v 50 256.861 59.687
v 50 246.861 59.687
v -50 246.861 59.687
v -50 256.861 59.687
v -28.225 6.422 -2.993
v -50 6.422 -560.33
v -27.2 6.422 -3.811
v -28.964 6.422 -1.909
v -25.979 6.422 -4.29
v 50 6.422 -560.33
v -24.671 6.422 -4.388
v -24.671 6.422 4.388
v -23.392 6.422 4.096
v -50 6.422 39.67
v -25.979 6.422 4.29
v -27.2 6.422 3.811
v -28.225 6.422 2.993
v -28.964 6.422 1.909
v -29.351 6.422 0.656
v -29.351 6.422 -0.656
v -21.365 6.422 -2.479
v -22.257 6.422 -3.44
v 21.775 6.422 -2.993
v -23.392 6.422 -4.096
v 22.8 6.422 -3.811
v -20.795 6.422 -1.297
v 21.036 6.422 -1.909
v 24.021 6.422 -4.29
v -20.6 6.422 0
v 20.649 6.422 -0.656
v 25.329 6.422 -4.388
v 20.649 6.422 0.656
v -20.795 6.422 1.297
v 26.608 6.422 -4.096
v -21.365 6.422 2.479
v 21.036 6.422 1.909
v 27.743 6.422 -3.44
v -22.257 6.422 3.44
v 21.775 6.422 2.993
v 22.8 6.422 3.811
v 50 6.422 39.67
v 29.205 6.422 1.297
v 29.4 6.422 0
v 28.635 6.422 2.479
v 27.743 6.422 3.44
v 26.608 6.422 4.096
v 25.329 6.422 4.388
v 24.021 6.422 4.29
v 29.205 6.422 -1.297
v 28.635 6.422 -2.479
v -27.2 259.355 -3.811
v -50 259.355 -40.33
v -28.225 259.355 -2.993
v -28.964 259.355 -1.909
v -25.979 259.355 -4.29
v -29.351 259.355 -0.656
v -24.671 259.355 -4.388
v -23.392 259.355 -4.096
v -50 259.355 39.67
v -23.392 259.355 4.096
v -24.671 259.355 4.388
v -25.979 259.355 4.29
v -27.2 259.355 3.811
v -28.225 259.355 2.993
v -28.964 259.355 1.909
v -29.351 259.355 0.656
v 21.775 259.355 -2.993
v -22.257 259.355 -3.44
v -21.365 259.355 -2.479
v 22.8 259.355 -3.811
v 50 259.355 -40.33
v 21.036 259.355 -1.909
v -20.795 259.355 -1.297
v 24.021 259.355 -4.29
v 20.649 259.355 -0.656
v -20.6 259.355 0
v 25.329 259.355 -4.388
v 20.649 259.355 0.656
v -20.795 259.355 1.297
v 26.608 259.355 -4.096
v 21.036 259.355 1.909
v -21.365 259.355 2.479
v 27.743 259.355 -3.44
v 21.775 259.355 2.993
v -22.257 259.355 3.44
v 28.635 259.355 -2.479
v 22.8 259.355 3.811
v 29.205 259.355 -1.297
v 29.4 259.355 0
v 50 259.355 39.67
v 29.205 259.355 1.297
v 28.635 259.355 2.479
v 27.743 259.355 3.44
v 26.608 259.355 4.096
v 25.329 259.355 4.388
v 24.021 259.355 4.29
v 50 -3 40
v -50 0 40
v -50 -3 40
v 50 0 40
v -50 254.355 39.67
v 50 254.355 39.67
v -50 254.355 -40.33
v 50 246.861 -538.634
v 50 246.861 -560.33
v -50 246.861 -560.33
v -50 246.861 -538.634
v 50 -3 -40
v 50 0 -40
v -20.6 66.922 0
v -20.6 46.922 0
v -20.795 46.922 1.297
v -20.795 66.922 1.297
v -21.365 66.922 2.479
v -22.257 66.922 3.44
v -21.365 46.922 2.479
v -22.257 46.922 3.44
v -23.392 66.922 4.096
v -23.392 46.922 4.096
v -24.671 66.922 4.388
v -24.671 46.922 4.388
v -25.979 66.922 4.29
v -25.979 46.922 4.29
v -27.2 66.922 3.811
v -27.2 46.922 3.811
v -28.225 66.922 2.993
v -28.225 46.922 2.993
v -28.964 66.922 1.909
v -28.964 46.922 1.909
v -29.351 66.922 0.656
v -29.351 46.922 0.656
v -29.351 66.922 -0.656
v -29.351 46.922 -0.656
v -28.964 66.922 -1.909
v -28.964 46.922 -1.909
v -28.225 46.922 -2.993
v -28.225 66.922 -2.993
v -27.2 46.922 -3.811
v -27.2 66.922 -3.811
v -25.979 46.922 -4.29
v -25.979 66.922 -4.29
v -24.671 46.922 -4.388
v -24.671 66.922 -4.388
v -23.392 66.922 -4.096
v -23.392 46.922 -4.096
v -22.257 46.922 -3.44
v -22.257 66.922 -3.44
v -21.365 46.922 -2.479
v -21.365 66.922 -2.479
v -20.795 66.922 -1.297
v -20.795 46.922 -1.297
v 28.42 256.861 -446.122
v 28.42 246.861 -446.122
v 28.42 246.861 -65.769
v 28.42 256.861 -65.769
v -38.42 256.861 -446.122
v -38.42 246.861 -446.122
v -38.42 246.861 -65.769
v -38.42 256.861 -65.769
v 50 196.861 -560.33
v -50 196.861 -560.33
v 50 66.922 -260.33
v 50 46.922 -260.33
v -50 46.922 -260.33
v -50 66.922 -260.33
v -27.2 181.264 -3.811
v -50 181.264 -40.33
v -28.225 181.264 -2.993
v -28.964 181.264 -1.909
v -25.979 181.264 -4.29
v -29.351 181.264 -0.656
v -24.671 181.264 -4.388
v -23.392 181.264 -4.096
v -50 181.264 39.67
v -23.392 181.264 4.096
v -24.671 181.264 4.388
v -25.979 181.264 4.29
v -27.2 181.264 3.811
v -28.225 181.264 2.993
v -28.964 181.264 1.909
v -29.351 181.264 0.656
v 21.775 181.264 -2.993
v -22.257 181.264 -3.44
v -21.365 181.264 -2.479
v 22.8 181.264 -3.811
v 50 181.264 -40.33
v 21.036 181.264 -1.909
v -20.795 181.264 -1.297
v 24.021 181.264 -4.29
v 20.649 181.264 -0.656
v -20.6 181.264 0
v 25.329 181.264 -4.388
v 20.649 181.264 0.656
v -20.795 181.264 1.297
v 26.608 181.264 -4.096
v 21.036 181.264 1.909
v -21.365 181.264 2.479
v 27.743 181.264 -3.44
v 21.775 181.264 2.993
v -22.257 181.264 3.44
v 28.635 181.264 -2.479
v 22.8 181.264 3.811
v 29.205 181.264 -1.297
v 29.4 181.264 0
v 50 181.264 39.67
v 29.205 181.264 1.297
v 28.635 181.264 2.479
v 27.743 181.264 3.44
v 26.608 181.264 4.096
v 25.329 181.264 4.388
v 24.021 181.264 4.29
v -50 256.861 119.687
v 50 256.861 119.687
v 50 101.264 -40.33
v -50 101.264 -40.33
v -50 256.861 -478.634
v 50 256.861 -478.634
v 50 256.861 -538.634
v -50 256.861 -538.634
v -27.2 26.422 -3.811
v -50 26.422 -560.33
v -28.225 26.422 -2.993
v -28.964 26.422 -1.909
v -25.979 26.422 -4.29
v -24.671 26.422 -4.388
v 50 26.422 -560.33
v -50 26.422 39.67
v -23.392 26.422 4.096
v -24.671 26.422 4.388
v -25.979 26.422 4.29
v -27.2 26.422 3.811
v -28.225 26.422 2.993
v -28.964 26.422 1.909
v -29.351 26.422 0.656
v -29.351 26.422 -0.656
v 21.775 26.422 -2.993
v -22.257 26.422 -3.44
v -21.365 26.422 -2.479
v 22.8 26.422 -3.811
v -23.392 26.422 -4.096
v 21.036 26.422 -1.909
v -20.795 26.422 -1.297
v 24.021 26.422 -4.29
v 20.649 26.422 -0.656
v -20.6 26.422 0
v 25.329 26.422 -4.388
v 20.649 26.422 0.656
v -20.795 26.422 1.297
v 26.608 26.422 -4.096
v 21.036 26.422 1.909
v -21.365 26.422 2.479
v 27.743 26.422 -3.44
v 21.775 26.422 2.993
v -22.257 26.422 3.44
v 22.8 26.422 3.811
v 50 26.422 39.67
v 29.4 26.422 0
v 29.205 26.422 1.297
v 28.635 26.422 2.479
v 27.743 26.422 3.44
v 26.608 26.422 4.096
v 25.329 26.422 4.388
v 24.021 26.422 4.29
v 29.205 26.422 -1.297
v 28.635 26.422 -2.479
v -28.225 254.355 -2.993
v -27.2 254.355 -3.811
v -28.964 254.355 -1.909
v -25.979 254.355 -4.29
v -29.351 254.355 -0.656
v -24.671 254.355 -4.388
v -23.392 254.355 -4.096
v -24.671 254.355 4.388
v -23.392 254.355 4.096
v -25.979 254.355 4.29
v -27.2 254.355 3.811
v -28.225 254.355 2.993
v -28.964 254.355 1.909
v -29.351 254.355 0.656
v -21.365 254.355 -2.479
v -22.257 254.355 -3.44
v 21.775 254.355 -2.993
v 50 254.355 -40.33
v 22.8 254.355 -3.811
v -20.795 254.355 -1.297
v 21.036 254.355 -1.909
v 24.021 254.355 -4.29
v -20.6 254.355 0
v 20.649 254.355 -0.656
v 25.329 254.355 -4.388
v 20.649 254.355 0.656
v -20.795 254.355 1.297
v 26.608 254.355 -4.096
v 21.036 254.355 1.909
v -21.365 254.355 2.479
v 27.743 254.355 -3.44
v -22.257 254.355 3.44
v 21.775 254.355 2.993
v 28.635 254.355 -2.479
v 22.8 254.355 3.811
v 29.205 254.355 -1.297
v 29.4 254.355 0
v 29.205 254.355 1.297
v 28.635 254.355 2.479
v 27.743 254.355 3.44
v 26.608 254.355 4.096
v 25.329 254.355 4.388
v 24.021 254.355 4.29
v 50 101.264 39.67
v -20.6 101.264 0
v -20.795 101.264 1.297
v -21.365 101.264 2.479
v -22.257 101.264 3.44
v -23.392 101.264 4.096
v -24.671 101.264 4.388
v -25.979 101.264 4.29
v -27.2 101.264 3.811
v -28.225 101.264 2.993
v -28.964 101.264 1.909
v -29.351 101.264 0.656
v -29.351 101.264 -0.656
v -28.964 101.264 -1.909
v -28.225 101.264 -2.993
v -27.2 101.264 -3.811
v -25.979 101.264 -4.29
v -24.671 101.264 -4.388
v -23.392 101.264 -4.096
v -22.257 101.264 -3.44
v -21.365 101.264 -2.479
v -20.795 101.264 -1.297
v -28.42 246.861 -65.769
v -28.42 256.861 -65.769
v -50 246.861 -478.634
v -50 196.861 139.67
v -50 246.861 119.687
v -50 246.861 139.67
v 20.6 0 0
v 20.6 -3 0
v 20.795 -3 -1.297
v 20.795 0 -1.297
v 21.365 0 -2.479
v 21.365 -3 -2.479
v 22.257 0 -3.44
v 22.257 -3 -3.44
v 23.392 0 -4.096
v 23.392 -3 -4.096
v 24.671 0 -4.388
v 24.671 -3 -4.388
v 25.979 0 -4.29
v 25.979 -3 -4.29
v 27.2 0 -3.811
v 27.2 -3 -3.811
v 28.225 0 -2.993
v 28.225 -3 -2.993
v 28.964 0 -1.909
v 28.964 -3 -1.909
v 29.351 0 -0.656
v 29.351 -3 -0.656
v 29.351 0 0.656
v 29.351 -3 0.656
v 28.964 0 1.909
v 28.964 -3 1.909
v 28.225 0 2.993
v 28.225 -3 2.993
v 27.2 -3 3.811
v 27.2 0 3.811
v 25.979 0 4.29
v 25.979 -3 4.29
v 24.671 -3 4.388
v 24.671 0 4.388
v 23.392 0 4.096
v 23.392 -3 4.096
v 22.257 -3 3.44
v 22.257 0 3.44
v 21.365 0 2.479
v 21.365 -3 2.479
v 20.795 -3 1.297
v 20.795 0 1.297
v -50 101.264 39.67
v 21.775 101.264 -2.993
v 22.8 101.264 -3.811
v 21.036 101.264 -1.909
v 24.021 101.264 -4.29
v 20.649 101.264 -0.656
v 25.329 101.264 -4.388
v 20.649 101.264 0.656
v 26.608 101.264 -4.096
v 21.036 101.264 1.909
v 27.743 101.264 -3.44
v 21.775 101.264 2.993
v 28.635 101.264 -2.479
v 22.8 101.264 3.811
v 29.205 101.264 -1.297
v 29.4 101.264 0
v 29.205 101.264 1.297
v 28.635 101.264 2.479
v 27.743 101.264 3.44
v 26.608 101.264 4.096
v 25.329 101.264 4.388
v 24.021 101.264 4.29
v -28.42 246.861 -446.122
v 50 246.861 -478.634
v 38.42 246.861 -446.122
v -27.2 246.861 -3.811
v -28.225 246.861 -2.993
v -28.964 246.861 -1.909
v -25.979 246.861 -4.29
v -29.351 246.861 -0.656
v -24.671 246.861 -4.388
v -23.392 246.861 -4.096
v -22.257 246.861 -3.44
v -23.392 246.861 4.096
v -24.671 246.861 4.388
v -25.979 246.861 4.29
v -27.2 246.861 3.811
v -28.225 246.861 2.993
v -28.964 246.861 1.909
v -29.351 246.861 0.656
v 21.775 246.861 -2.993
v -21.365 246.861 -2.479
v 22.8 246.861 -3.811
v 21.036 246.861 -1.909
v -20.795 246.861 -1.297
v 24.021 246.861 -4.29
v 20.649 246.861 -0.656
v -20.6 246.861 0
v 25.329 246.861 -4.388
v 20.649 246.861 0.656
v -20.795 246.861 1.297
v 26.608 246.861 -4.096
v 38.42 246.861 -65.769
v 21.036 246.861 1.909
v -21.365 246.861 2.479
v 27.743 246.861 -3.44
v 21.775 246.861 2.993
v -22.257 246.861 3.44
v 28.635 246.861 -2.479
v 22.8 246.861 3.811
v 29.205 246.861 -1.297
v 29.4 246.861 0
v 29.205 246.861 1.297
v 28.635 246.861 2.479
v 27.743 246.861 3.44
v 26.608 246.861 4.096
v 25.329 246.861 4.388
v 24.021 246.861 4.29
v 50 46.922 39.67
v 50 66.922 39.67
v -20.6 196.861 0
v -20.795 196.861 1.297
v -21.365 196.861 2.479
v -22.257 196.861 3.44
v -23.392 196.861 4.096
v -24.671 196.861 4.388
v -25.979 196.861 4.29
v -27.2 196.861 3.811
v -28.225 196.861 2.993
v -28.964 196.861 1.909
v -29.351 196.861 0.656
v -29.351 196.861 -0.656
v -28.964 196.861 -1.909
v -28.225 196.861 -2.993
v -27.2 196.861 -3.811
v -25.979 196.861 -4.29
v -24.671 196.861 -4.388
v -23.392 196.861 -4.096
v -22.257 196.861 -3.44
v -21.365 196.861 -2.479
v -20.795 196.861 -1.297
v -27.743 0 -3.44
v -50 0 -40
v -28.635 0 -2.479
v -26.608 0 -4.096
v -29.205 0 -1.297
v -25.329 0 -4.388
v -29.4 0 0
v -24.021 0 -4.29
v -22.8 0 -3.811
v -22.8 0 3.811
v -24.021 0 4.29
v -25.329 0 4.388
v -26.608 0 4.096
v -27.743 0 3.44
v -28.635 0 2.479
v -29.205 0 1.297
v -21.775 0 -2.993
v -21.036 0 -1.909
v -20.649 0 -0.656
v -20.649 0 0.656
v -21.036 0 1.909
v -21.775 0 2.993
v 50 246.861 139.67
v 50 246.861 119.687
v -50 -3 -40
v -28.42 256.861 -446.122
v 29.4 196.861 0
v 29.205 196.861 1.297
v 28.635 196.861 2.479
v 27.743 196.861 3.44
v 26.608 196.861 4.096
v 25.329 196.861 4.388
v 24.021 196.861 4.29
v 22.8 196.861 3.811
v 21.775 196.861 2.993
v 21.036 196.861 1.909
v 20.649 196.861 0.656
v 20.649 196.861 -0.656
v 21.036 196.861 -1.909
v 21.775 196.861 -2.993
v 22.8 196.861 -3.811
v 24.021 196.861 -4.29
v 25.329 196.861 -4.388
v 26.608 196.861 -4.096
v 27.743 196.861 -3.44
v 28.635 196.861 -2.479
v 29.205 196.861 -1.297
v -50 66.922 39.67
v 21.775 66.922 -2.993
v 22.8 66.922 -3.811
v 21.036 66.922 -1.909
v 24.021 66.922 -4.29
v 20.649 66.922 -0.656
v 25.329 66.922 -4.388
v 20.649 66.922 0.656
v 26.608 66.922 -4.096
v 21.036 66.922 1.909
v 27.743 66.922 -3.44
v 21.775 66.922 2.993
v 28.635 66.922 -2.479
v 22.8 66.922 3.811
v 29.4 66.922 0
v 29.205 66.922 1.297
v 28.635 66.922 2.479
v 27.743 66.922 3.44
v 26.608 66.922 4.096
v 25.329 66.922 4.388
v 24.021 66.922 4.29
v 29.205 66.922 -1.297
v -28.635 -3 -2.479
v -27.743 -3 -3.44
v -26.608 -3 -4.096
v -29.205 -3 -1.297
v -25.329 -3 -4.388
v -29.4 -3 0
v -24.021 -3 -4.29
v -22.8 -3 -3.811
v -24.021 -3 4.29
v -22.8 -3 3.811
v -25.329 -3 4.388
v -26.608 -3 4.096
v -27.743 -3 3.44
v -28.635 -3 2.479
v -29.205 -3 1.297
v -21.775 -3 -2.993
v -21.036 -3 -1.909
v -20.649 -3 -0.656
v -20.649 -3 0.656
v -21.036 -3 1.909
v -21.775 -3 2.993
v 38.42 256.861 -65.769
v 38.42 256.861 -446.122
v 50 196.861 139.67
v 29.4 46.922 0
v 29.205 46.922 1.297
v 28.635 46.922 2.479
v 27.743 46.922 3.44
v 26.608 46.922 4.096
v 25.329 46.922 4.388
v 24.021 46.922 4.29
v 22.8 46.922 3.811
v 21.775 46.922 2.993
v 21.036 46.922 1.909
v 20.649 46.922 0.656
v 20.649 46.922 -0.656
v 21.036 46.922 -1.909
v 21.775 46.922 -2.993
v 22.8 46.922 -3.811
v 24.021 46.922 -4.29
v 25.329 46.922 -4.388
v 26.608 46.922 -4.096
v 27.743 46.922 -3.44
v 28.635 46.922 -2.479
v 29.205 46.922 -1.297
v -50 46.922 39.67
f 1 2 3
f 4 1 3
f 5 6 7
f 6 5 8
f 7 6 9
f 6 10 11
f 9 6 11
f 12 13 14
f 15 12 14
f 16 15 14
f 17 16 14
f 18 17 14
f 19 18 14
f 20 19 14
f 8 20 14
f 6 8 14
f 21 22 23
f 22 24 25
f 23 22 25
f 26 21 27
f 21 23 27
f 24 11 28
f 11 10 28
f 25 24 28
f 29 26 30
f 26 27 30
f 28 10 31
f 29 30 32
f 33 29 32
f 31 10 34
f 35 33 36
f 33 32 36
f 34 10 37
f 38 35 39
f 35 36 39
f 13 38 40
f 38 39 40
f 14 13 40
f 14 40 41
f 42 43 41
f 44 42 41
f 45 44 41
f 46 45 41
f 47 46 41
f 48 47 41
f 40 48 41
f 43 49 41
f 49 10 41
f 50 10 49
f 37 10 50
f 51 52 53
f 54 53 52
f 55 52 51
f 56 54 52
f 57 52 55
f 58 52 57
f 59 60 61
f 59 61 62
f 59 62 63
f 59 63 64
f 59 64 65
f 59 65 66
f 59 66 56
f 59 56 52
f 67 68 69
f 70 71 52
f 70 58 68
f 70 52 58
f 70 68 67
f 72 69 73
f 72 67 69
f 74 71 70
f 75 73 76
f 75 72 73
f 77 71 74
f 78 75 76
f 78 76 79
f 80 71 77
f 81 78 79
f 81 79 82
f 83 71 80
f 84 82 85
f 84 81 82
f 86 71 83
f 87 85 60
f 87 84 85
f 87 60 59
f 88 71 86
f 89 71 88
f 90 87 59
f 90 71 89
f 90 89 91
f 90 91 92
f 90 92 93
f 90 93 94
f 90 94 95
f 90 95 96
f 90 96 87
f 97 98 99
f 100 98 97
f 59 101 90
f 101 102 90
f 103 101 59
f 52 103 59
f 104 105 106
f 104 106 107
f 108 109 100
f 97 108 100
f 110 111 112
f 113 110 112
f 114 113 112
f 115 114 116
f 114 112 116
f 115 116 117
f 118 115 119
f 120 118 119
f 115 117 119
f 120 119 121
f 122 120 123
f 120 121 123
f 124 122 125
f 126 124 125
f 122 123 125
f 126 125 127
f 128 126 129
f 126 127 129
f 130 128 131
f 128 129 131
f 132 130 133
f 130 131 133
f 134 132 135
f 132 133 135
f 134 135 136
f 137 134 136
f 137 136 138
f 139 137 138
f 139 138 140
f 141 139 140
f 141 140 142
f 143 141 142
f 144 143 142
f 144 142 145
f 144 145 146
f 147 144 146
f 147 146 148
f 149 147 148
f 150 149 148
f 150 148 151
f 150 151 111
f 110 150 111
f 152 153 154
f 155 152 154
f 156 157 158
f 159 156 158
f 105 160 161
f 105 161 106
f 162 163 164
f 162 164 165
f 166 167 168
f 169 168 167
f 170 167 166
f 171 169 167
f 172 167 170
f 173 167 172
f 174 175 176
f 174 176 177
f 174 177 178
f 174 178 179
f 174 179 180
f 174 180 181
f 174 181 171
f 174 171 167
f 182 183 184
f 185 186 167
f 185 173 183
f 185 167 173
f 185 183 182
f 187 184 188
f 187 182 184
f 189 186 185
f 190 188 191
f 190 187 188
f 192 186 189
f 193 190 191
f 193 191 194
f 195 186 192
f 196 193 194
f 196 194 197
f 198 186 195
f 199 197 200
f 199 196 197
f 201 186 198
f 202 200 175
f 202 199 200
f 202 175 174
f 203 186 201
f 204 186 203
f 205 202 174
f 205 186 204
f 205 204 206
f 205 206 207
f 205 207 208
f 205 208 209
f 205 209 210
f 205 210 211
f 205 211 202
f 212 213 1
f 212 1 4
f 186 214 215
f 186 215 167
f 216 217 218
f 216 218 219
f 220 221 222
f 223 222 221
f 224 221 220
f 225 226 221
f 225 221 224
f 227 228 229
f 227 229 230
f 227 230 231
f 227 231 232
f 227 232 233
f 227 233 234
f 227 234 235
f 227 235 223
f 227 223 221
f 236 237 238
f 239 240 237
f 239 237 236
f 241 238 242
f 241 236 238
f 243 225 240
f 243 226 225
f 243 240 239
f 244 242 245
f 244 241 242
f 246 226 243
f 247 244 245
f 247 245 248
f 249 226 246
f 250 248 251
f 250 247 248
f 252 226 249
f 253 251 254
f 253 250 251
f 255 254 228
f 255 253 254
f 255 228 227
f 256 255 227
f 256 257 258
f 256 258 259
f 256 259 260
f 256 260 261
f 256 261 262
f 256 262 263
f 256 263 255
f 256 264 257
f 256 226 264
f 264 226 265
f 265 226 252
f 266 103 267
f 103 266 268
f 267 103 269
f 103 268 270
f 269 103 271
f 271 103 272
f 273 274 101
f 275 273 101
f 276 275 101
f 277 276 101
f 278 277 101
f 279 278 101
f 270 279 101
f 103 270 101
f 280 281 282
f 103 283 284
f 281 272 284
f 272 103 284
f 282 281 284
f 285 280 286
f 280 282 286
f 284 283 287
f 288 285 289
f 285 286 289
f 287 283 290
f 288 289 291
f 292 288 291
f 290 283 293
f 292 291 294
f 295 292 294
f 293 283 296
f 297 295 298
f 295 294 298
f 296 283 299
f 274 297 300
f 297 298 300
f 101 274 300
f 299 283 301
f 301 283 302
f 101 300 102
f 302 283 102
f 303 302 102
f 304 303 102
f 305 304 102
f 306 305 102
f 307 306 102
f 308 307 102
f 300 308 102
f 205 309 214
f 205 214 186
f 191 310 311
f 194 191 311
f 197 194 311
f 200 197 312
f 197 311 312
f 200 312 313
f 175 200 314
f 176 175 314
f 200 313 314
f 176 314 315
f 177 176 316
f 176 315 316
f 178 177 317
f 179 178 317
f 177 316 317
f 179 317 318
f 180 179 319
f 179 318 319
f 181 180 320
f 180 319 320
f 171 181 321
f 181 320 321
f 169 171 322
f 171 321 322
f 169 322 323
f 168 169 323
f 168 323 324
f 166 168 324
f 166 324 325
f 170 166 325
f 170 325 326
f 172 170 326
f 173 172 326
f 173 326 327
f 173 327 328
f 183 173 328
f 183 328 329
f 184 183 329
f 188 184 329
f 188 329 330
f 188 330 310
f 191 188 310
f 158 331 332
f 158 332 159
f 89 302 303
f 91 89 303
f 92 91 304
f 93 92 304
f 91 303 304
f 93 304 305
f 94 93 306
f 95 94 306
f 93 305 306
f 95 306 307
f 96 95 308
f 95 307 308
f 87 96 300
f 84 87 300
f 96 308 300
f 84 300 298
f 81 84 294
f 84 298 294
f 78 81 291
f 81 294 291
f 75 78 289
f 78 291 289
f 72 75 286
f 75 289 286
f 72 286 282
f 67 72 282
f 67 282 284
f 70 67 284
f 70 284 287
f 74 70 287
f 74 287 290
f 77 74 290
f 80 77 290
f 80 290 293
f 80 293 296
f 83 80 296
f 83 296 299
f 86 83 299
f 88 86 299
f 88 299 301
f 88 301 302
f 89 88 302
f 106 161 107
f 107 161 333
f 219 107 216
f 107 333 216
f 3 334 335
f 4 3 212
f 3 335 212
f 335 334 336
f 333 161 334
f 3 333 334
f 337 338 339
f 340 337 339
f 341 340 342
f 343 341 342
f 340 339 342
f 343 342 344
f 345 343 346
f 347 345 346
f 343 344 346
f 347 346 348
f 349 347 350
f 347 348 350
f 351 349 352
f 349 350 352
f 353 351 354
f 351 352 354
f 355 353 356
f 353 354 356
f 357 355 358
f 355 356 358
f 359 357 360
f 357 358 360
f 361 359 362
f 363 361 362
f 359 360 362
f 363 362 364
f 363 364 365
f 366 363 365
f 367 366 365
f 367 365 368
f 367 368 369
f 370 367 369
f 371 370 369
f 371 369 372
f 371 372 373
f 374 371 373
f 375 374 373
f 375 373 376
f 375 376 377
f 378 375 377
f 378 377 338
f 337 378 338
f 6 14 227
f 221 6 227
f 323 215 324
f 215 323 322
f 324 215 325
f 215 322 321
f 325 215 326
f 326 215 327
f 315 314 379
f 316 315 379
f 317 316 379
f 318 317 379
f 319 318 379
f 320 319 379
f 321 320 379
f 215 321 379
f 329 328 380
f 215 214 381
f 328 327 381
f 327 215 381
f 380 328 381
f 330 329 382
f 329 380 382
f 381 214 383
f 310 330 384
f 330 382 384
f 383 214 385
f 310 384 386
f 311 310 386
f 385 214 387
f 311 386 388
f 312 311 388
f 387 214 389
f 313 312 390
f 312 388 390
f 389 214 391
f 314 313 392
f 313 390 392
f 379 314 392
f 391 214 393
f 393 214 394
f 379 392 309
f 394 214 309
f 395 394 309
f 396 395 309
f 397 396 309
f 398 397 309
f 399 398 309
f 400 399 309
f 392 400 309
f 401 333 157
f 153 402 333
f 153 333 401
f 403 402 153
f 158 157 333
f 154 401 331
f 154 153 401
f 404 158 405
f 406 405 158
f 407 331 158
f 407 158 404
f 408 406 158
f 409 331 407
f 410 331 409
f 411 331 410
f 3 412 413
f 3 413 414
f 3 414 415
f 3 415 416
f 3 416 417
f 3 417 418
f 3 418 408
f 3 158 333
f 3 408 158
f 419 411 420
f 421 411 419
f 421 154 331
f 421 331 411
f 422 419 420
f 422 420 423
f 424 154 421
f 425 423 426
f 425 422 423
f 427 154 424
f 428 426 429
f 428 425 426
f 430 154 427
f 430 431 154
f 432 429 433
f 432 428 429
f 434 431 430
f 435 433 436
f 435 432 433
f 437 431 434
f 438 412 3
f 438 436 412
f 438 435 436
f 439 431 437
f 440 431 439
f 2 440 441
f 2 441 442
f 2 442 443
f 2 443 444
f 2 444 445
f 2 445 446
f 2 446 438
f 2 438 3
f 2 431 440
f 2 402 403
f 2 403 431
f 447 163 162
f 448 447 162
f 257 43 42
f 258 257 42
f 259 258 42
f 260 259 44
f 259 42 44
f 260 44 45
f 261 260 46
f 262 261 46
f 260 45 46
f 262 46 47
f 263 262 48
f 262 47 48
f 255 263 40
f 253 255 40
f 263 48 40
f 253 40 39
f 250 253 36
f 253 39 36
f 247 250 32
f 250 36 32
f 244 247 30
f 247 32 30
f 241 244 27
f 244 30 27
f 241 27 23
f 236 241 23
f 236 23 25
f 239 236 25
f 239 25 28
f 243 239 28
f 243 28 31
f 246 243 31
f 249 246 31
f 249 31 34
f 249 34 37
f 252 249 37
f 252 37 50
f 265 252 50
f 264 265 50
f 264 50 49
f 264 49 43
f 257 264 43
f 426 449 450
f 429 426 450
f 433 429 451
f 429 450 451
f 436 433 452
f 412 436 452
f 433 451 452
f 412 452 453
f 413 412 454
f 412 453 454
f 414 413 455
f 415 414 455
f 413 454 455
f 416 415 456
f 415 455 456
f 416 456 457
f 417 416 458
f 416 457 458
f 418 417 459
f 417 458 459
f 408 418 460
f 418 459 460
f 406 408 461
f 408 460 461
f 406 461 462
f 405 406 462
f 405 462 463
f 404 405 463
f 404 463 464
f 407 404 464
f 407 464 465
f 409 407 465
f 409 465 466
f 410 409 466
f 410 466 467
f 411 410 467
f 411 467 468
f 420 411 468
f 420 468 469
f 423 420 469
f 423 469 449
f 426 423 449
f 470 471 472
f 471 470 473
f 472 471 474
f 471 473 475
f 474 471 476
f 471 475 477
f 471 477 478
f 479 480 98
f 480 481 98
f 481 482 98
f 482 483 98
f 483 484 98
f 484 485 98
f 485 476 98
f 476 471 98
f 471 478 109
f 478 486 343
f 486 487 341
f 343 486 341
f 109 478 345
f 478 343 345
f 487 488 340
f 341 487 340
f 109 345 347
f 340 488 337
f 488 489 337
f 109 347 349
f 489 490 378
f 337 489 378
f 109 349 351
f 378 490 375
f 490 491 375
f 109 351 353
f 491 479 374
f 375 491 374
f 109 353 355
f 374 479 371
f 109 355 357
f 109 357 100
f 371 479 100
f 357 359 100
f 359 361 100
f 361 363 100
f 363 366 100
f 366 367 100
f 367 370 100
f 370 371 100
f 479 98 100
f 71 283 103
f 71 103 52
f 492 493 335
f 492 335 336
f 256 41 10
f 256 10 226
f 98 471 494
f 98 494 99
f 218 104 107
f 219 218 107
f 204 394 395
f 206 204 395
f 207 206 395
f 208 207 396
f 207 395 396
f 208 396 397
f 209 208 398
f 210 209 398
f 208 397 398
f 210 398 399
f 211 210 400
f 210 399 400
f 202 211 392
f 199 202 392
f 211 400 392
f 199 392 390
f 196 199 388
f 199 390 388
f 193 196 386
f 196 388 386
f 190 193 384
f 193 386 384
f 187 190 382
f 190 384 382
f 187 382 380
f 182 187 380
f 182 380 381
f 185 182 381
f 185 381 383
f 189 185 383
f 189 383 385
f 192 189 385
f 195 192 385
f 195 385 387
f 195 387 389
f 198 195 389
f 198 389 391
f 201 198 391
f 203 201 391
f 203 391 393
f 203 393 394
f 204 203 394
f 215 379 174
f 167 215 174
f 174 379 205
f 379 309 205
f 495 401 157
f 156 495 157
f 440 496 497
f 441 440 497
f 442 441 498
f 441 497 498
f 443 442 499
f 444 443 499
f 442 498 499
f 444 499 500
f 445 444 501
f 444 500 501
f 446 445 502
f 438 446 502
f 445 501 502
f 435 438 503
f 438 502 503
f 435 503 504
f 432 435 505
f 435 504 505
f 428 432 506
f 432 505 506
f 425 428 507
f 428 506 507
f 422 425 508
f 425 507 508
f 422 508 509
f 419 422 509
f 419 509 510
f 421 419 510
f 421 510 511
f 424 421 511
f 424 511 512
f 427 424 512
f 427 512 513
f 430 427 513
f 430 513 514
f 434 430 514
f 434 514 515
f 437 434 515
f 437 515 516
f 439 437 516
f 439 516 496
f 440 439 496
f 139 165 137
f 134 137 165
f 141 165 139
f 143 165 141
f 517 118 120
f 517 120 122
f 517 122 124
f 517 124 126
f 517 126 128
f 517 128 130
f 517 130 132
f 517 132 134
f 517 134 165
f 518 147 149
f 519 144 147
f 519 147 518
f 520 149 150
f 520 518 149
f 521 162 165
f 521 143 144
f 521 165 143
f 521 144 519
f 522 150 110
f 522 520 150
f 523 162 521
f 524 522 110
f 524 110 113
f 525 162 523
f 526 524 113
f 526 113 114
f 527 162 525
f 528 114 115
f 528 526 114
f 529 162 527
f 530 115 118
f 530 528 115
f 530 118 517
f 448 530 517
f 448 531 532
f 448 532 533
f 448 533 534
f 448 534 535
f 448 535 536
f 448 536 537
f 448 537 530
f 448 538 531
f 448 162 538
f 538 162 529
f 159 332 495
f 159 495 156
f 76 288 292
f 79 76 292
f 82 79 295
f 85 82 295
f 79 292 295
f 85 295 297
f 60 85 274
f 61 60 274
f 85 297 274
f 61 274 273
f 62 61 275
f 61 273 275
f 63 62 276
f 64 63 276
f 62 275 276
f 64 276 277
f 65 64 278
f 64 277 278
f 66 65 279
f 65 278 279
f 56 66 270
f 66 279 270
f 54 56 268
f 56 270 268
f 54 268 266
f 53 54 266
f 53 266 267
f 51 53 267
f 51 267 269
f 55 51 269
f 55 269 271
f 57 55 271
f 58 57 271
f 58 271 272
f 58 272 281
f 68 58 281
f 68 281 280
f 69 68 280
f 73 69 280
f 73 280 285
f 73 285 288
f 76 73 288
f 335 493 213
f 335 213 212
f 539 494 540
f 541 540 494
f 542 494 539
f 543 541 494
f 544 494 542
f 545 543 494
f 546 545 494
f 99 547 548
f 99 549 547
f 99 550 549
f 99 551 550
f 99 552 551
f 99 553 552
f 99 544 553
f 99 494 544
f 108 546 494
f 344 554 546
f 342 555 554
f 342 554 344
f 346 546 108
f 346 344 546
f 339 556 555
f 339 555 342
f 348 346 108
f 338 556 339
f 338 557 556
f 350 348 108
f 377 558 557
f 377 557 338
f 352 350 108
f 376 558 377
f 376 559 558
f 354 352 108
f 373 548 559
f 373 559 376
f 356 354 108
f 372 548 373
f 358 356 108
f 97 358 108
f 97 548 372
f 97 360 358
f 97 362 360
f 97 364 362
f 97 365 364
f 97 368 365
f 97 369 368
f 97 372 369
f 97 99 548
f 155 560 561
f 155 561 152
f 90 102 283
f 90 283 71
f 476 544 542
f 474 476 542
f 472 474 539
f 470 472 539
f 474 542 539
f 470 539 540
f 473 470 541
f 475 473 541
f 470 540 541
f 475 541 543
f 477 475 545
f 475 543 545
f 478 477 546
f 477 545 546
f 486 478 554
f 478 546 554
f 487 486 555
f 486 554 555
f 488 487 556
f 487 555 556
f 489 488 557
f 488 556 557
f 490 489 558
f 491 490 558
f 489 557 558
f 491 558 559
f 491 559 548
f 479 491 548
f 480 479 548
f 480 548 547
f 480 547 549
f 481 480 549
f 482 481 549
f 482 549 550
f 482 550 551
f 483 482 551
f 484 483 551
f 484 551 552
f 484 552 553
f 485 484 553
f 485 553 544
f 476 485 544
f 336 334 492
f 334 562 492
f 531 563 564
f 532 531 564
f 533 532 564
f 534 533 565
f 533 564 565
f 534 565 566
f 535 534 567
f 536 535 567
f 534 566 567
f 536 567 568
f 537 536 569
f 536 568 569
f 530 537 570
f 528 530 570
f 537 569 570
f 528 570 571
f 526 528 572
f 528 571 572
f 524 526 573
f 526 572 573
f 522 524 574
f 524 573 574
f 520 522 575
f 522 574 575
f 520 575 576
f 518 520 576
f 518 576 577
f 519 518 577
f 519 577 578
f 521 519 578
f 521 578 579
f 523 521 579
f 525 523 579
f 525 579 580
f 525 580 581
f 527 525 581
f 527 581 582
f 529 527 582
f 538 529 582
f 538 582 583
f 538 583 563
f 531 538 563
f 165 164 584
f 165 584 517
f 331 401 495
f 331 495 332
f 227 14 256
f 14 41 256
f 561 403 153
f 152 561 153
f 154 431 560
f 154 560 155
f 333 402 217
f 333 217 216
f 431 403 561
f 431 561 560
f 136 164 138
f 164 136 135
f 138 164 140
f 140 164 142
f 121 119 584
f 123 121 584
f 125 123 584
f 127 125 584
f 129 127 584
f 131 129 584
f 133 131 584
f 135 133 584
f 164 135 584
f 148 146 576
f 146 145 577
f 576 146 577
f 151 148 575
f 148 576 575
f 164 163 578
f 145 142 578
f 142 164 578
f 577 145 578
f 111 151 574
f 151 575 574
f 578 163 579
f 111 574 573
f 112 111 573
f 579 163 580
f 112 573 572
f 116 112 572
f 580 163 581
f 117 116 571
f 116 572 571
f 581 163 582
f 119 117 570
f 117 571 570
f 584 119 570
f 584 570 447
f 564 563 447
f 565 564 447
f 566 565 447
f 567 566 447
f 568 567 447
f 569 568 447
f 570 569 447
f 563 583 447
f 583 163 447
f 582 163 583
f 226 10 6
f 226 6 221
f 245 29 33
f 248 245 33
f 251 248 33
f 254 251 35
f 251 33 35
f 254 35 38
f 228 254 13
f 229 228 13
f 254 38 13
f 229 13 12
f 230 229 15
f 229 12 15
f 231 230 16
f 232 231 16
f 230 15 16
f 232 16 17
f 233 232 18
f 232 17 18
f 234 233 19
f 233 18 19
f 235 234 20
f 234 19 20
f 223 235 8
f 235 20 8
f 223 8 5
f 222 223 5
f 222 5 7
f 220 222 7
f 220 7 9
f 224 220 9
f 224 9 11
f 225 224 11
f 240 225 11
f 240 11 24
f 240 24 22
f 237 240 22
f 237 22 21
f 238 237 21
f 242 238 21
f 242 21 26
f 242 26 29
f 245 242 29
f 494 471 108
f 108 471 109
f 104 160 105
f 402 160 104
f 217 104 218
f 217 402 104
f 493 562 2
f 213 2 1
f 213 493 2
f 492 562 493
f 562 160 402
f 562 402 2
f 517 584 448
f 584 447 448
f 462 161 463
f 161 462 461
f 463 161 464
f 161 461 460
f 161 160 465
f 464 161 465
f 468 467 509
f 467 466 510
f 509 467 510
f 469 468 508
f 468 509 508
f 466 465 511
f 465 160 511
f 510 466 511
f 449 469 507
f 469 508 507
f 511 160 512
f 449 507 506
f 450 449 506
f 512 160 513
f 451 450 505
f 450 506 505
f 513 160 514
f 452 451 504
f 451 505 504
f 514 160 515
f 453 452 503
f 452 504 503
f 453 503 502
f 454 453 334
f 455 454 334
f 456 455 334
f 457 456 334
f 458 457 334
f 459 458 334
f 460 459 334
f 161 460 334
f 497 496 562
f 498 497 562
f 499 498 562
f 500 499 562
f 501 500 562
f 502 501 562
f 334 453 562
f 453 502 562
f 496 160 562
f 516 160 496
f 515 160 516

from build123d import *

# Parameters (mm, degrees)
F0_W       = 100
F0_H       = 80
F1_DEPTH   = 3
F2_W       = 20
F2_H       = 600
F3_DEPTH   = 50
F2_W_2     = 80
F2_H_2     = 80
F2_W_3     = 50
F2_H_3     = 700
F2_W_4     = 5
F2_H_4     = 300
F4_D       = 8.8
F4_DEPTH   = 259.3560133705
F4_2_D     = 8.8
F4_2_DEPTH = 259.3560133705
F4_3_D     = 8.8
F4_3_DEPTH = 259.3560133705
F4_4_D     = 8.8
F4_4_DEPTH = 259.3560133705
F4_5_D     = 8.8
F4_5_DEPTH = 259.3560133705
F5_D       = 8.8
F6_W       = 10
F6_H       = 380.3535103798
F6_W_2     = 100
F6_H_2     = 60
F7_DEPTH   = 10


with BuildPart() as f1:
    # F0 (on Front) → F1 (new body)
    with BuildSketch(Plane.XZ):
        Rectangle(F0_W, F0_H)
    extrude(amount=F1_DEPTH)

    # F5 (through all)
    with Locations(Plane(origin=(0, 0, 0), x_dir=(1, 0, 0), z_dir=(0, 1, 0))):
        with Locations((-25, 0), (25, 0)):
            Hole(F5_D / 2)


with BuildPart() as f3:
    # F2 (on Right) → F3 (new body, symmetric)
    with BuildSketch(Plane.YZ):
        with Locations((16.4218770899, -260.329894186)):
            Rectangle(F2_W, F2_H)
    extrude(amount=F3_DEPTH, both=True)

    # F4 (through all, one way)
    with BuildSketch(Plane.XZ):
        with Locations((-25, 0), (25, 0)):
            Circle(F4_D / 2)
    extrude(amount=-F4_DEPTH, mode=Mode.SUBTRACT)


with BuildPart() as f3b:
    # F2 (on Right) → F3, piece 2 (new body, symmetric)
    with BuildSketch(Plane.YZ):
        with Locations((141.2636143714, -0.329894186)):
            Rectangle(F2_W_2, F2_H_2)
    extrude(amount=F3_DEPTH, both=True)

    # F4#2 (through all, one way)
    with BuildSketch(Plane.XZ):
        with Locations((-25, 0), (25, 0)):
            Circle(F4_2_D / 2)
    extrude(amount=-F4_2_DEPTH, mode=Mode.SUBTRACT)


with BuildPart() as f3c:
    # F2 (on Right) → F3, piece 3 (new body, symmetric)
    with BuildSketch(Plane.YZ):
        with Locations((221.8606114388, -210.329894186)):
            Rectangle(F2_W_3, F2_H_3)
    extrude(amount=F3_DEPTH, both=True)

    # F4#3 (through all, one way)
    with BuildSketch(Plane.XZ):
        with Locations((-25, 0), (25, 0)):
            Circle(F4_3_D / 2)
    extrude(amount=-F4_3_DEPTH, mode=Mode.SUBTRACT)

    # F6 (on face) → F7 (join)
    with BuildSketch(Plane(origin=(0, 246.8606114388, 0), x_dir=(-1, 0, 0), z_dir=(0, 1, 0))):
        with Locations((33.4200662374, -255.9455633163)):
            Rectangle(F6_W, F6_H)
        with Locations((-33.4200662374, -255.9455633163)):
            Rectangle(F6_W, F6_H)
        with Locations((0, 89.686884284)):
            Rectangle(F6_W_2, F6_H_2)
        with Locations((0, -508.6336445808)):
            Rectangle(F6_W_2, F6_H_2)
    extrude(amount=F7_DEPTH)


with BuildPart() as f3d:
    # F2 (on Right) → F3, piece 4 (new body, symmetric)
    with BuildSketch(Plane.YZ):
        with Locations((256.8550133705, -0.329894186)):
            Rectangle(F2_W_4, F2_H_2)
    extrude(amount=F3_DEPTH, both=True)

    # F4#4 (through all, one way)
    with BuildSketch(Plane.XZ):
        with Locations((-25, 0), (25, 0)):
            Circle(F4_4_D / 2)
    extrude(amount=-F4_4_DEPTH, mode=Mode.SUBTRACT)


with BuildPart() as f3e:
    # F2 (on Right) → F3, piece 5 (new body, symmetric)
    with BuildSketch(Plane.YZ):
        with Locations((56.9222590327, -110.329894186)):
            Rectangle(F2_W, F2_H_4)
    extrude(amount=F3_DEPTH, both=True)

    # F4#5 (through all, one way)
    with BuildSketch(Plane.XZ):
        with Locations((-25, 0), (25, 0)):
            Circle(F4_5_D / 2)
    extrude(amount=-F4_5_DEPTH, mode=Mode.SUBTRACT)


solid = Compound([f1.part, f3.part, f3b.part, f3c.part, f3d.part, f3e.part])
